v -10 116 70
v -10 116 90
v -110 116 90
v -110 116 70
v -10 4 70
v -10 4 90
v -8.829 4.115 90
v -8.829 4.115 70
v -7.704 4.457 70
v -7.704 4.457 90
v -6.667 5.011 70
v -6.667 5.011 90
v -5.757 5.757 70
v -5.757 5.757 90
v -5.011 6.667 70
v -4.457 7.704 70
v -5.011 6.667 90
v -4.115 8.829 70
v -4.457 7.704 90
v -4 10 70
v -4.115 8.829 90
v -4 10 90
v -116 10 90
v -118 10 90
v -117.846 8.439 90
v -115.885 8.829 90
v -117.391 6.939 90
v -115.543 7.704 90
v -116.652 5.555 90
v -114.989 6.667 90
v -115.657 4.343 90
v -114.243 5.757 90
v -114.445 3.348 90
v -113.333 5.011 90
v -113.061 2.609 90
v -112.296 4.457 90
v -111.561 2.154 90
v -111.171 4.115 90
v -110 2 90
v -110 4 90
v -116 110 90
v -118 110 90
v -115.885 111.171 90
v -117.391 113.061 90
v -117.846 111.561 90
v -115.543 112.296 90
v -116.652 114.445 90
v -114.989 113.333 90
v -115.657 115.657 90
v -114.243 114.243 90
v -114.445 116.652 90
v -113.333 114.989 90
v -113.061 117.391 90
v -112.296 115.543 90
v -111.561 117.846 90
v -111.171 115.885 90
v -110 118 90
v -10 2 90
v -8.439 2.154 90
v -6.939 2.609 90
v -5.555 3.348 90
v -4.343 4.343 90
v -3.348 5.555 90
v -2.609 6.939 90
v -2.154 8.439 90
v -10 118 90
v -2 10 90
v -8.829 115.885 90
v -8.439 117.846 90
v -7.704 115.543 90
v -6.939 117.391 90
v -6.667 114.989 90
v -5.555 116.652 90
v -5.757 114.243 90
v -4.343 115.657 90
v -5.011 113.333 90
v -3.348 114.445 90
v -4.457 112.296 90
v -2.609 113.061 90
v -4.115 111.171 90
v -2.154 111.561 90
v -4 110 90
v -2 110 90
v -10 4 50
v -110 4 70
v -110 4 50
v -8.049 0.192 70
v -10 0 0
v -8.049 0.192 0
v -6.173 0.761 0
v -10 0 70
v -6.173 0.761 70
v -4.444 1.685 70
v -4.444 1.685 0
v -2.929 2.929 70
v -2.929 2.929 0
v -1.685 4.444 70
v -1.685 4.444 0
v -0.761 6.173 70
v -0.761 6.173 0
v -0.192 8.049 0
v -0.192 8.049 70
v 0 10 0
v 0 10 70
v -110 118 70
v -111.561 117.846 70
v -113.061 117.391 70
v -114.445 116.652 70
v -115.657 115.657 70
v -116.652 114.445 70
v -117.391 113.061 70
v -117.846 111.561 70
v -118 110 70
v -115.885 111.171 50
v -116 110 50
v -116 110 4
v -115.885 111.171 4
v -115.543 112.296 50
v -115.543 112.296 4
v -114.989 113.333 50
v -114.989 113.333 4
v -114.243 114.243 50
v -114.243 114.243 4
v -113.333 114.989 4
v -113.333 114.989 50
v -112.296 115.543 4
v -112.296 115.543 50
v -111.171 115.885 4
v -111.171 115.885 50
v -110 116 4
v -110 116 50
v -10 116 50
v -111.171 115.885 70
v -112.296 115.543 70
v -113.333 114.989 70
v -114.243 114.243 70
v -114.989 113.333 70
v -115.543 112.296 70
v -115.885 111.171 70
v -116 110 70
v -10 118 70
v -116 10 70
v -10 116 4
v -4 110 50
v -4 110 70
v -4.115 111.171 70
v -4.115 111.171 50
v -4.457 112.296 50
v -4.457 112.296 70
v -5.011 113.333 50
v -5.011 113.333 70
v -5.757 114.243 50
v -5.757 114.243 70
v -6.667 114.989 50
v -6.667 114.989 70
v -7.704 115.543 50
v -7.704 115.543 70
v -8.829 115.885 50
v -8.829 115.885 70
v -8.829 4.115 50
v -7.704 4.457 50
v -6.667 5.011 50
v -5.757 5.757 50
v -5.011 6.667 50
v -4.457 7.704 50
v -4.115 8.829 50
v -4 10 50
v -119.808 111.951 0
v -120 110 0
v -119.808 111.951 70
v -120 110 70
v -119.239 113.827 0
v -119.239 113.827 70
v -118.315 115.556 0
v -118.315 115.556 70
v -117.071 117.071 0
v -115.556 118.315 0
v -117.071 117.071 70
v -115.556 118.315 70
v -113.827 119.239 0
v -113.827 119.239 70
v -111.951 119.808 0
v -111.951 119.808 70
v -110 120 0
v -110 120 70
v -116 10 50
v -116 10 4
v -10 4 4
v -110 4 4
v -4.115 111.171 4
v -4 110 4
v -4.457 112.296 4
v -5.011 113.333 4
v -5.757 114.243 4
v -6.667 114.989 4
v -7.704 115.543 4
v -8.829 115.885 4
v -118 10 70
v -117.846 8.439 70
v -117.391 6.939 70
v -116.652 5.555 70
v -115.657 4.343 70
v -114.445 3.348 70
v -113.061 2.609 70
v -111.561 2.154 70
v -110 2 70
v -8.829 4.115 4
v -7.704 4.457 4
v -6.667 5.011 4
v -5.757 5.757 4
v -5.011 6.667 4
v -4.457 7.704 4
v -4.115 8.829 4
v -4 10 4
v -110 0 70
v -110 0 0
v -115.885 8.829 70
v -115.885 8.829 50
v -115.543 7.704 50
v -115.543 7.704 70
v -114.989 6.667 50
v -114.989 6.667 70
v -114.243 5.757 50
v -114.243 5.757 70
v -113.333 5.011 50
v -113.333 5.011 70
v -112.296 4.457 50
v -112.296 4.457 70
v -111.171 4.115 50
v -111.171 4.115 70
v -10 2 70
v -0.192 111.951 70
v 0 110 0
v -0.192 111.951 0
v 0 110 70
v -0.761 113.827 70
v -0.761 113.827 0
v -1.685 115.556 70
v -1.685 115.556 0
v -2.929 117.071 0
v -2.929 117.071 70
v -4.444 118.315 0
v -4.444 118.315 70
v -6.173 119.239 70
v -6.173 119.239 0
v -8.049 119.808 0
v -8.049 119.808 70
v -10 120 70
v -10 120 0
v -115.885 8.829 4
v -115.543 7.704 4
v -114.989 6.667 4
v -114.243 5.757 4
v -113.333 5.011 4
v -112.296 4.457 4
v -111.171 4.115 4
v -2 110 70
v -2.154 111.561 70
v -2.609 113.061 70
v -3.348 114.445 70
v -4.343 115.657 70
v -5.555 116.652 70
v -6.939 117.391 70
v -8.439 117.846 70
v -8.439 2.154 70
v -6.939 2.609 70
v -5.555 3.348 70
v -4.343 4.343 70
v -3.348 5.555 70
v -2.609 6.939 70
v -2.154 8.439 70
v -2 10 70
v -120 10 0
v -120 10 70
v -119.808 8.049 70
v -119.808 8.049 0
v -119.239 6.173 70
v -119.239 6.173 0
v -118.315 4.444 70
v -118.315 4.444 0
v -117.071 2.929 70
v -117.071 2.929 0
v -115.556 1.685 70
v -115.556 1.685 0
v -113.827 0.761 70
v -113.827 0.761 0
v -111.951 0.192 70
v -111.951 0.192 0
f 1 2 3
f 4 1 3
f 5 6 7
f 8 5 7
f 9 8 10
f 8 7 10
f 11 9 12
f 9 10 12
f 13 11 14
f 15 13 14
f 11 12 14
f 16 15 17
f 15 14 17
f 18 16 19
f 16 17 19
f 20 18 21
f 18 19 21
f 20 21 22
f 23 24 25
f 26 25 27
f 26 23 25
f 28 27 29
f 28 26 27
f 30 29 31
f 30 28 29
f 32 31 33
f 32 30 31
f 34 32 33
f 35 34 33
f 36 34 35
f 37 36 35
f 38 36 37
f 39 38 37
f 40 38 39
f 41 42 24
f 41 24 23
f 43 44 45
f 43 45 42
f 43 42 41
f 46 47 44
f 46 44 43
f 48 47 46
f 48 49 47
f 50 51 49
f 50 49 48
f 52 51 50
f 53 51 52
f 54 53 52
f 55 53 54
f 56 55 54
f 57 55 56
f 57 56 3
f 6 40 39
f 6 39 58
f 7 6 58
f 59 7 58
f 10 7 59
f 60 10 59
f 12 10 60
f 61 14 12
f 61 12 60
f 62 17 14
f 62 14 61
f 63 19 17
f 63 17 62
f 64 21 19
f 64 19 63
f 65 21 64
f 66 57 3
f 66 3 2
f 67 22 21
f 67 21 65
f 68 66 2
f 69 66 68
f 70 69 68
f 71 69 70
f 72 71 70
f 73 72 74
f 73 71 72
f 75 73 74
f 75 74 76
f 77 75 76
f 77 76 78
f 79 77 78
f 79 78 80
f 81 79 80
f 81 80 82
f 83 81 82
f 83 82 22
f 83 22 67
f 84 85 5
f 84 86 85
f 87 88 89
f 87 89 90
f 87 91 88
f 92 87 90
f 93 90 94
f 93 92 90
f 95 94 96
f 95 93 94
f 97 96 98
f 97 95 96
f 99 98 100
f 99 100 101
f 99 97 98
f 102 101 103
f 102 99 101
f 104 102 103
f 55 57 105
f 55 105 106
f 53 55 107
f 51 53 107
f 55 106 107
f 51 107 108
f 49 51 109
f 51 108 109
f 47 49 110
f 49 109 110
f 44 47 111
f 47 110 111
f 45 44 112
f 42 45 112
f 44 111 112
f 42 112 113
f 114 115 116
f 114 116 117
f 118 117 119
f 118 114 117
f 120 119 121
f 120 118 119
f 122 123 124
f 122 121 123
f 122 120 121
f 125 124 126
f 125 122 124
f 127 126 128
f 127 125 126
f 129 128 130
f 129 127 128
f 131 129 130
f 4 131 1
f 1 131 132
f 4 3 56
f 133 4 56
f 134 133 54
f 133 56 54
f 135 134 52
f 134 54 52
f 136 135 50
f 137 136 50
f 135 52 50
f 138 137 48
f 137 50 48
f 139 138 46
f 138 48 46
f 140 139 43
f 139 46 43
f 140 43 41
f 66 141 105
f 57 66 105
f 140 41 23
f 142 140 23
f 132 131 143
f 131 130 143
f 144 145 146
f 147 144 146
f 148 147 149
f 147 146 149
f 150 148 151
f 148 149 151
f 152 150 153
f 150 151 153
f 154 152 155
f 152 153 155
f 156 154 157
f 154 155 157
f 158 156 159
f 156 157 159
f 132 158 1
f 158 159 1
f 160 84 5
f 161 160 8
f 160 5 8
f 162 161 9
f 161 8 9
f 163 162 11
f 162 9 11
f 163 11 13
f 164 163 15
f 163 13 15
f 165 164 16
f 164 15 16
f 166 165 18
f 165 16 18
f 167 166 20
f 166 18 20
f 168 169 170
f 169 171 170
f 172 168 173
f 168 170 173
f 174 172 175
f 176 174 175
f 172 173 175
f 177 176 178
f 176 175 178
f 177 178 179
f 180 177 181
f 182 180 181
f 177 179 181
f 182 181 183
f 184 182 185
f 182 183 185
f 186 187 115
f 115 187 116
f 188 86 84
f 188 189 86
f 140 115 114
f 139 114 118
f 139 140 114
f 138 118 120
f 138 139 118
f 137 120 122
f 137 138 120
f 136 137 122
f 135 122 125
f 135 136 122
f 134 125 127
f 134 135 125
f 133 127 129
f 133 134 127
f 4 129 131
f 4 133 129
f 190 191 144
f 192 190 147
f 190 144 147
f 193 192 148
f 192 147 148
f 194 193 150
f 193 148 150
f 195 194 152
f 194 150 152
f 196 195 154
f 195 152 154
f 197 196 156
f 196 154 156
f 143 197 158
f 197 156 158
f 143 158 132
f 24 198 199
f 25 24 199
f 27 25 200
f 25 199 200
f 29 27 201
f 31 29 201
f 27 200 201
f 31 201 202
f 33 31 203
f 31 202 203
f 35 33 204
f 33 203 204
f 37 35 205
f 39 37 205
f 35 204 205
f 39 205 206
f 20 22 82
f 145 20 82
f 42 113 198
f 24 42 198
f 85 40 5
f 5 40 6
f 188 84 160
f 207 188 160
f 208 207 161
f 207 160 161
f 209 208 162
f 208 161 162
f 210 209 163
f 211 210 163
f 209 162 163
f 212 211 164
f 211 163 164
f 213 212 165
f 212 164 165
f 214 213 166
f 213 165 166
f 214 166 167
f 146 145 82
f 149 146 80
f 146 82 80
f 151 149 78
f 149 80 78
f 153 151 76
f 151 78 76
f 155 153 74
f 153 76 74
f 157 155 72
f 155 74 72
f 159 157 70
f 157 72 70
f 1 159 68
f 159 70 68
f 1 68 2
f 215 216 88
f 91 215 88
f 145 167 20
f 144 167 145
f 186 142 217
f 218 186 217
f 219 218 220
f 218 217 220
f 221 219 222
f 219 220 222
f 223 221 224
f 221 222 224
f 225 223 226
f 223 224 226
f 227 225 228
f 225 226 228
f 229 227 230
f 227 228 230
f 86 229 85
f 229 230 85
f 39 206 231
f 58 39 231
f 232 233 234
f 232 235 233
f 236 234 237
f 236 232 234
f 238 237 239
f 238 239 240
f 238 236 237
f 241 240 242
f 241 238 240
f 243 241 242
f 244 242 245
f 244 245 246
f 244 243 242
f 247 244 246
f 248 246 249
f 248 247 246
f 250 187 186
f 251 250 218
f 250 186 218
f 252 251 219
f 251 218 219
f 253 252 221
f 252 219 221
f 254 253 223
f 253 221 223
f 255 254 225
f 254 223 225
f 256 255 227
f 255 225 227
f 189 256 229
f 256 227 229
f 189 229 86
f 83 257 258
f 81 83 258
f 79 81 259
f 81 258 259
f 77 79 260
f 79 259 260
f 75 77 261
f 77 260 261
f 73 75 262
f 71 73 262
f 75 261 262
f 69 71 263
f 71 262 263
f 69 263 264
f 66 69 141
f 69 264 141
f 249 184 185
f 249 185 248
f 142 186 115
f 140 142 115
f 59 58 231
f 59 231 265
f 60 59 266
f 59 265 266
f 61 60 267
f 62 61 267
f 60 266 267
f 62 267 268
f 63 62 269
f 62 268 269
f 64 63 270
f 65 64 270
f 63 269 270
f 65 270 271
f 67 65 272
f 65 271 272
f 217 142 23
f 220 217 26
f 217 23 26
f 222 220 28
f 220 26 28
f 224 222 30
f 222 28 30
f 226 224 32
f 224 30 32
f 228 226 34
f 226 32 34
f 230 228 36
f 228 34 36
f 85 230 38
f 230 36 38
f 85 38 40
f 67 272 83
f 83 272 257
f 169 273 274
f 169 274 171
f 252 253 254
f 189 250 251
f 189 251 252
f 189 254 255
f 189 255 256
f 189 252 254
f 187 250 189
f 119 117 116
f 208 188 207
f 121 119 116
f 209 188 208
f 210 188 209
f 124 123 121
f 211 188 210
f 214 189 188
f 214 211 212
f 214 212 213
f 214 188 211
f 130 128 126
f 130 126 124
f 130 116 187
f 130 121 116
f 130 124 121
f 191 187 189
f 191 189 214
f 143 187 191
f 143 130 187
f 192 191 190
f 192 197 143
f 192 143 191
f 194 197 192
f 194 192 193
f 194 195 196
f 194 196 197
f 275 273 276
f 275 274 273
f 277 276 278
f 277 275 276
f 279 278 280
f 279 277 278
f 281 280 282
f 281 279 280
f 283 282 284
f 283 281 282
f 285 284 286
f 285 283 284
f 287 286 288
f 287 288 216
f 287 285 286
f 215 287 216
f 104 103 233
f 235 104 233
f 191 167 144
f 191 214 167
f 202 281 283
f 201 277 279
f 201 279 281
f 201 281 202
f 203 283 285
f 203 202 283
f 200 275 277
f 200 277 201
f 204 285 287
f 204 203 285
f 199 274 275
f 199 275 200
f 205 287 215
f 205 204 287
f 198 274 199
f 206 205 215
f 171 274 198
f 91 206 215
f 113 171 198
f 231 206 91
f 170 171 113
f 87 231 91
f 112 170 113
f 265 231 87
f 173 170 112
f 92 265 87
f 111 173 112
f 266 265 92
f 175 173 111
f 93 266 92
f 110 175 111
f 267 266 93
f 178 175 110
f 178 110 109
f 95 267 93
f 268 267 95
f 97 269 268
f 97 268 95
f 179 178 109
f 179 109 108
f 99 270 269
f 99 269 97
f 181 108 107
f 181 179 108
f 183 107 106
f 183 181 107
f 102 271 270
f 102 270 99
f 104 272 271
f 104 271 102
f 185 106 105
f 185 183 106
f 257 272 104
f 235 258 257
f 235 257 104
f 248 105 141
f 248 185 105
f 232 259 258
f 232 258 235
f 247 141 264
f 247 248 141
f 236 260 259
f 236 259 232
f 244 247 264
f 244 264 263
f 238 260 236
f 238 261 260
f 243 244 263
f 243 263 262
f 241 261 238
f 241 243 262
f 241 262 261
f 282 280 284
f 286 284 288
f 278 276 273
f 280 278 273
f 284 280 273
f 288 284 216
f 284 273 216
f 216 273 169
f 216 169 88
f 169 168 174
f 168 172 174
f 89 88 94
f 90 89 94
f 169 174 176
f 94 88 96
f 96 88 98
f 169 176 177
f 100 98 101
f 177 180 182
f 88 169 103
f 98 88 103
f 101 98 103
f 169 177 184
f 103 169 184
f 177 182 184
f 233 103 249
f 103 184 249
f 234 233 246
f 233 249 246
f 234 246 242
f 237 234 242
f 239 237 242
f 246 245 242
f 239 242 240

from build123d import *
from build123d.topology import SkipClean

# Parameters (mm, degrees)
SKETCH1_W           = 120
SKETCH1_H           = 120
BOSS_EXTRUDE2_DEPTH = 70
FILLET2_R           = 10
SHELL2_T            = -4
BOSS_EXTRUDE3_DEPTH = 20
CUT_EXTRUDE2_DEPTH  = 40


with BuildPart() as part:
    # Sketch1 → Boss-Extrude2 (new body)
    with BuildSketch(Plane.XY):
        with Locations((-60, 60)):
            Rectangle(SKETCH1_W, SKETCH1_H)
    extrude(amount=BOSS_EXTRUDE2_DEPTH)

    # Fillet2
    fillet2_edges = [part.edges().sort_by_distance(p)[0] for p in [
        (0, 120, 35),
        (0, 0, 35),
        (-120, 0, 35),
        (-120, 120, 35),
    ]]
    fillet(fillet2_edges, radius=FILLET2_R)

    # Shell2
    shell2_openings = [part.faces().sort_by_distance(p)[0] for p in [
        (-60, 60, 70),
    ]]
    offset(amount=SHELL2_T, openings=shell2_openings, kind=Kind.INTERSECTION)

    # 3DSketch3 → Boss-Extrude3 (add)
    with BuildSketch(Plane(origin=(-2, 10, 70), x_dir=(-0.7574099616005767, 0.6529396220694628, 0), z_dir=(0, 0, -1))):
        with BuildLine():
            Line((0, 0), (65.293962207, 75.74099616))
            ThreePointArc((65.293962207, 75.74099616), (70.762268416, 78.495621219), (76.576758876, 76.576758876))
            Line((76.576758876, 76.576758876), (152.317755036, 11.282796669))
            ThreePointArc((152.317755036, 11.282796669), (155.072380095, 5.814490461), (153.153517753, 0))
            Line((153.153517753, 0), (87.859555546, -75.74099616))
            ThreePointArc((87.859555546, -75.74099616), (82.391249337, -78.495621219), (76.576758876, -76.576758876))
            Line((76.576758876, -76.576758876), (0.835762716, -11.282796669))
            ThreePointArc((0.835762716, -11.282796669), (-1.918862343, -5.814490461), (0, 0))
        make_face()
    extrude(amount=-BOSS_EXTRUDE3_DEPTH)

    # 3DSketch4 → Cut-Extrude2 (cut)
    with SkipClean():  # the faces are left unmerged after this step: merging them gives an invalid solid
        with BuildSketch(Plane(origin=(-4, 10, 90), x_dir=(-0.7459376616259146, 0.6660157693088524, 0), z_dir=(0, 0, -1))):
            with BuildLine():
                Line((0, 0), (66.601576931, 74.593766163))
                ThreePointArc((66.601576931, 74.593766163), (70.738123029, 76.588082621), (75.073297516, 75.073297516))
                Line((75.073297516, 75.073297516), (149.667063679, 8.471720586))
                ThreePointArc((149.667063679, 8.471720586), (151.661380138, 4.335174488), (150.146595033, 0))
                Line((150.146595033, 0), (83.545018102, -74.593766163))
                ThreePointArc((83.545018102, -74.593766163), (79.408472004, -76.588082621), (75.073297516, -75.073297516))
                Line((75.073297516, -75.073297516), (0.479531354, -8.471720586))
                ThreePointArc((0.479531354, -8.471720586), (-1.514785105, -4.335174488), (0, 0))
            make_face()
        extrude(amount=CUT_EXTRUDE2_DEPTH, mode=Mode.SUBTRACT)


solid = part.part
